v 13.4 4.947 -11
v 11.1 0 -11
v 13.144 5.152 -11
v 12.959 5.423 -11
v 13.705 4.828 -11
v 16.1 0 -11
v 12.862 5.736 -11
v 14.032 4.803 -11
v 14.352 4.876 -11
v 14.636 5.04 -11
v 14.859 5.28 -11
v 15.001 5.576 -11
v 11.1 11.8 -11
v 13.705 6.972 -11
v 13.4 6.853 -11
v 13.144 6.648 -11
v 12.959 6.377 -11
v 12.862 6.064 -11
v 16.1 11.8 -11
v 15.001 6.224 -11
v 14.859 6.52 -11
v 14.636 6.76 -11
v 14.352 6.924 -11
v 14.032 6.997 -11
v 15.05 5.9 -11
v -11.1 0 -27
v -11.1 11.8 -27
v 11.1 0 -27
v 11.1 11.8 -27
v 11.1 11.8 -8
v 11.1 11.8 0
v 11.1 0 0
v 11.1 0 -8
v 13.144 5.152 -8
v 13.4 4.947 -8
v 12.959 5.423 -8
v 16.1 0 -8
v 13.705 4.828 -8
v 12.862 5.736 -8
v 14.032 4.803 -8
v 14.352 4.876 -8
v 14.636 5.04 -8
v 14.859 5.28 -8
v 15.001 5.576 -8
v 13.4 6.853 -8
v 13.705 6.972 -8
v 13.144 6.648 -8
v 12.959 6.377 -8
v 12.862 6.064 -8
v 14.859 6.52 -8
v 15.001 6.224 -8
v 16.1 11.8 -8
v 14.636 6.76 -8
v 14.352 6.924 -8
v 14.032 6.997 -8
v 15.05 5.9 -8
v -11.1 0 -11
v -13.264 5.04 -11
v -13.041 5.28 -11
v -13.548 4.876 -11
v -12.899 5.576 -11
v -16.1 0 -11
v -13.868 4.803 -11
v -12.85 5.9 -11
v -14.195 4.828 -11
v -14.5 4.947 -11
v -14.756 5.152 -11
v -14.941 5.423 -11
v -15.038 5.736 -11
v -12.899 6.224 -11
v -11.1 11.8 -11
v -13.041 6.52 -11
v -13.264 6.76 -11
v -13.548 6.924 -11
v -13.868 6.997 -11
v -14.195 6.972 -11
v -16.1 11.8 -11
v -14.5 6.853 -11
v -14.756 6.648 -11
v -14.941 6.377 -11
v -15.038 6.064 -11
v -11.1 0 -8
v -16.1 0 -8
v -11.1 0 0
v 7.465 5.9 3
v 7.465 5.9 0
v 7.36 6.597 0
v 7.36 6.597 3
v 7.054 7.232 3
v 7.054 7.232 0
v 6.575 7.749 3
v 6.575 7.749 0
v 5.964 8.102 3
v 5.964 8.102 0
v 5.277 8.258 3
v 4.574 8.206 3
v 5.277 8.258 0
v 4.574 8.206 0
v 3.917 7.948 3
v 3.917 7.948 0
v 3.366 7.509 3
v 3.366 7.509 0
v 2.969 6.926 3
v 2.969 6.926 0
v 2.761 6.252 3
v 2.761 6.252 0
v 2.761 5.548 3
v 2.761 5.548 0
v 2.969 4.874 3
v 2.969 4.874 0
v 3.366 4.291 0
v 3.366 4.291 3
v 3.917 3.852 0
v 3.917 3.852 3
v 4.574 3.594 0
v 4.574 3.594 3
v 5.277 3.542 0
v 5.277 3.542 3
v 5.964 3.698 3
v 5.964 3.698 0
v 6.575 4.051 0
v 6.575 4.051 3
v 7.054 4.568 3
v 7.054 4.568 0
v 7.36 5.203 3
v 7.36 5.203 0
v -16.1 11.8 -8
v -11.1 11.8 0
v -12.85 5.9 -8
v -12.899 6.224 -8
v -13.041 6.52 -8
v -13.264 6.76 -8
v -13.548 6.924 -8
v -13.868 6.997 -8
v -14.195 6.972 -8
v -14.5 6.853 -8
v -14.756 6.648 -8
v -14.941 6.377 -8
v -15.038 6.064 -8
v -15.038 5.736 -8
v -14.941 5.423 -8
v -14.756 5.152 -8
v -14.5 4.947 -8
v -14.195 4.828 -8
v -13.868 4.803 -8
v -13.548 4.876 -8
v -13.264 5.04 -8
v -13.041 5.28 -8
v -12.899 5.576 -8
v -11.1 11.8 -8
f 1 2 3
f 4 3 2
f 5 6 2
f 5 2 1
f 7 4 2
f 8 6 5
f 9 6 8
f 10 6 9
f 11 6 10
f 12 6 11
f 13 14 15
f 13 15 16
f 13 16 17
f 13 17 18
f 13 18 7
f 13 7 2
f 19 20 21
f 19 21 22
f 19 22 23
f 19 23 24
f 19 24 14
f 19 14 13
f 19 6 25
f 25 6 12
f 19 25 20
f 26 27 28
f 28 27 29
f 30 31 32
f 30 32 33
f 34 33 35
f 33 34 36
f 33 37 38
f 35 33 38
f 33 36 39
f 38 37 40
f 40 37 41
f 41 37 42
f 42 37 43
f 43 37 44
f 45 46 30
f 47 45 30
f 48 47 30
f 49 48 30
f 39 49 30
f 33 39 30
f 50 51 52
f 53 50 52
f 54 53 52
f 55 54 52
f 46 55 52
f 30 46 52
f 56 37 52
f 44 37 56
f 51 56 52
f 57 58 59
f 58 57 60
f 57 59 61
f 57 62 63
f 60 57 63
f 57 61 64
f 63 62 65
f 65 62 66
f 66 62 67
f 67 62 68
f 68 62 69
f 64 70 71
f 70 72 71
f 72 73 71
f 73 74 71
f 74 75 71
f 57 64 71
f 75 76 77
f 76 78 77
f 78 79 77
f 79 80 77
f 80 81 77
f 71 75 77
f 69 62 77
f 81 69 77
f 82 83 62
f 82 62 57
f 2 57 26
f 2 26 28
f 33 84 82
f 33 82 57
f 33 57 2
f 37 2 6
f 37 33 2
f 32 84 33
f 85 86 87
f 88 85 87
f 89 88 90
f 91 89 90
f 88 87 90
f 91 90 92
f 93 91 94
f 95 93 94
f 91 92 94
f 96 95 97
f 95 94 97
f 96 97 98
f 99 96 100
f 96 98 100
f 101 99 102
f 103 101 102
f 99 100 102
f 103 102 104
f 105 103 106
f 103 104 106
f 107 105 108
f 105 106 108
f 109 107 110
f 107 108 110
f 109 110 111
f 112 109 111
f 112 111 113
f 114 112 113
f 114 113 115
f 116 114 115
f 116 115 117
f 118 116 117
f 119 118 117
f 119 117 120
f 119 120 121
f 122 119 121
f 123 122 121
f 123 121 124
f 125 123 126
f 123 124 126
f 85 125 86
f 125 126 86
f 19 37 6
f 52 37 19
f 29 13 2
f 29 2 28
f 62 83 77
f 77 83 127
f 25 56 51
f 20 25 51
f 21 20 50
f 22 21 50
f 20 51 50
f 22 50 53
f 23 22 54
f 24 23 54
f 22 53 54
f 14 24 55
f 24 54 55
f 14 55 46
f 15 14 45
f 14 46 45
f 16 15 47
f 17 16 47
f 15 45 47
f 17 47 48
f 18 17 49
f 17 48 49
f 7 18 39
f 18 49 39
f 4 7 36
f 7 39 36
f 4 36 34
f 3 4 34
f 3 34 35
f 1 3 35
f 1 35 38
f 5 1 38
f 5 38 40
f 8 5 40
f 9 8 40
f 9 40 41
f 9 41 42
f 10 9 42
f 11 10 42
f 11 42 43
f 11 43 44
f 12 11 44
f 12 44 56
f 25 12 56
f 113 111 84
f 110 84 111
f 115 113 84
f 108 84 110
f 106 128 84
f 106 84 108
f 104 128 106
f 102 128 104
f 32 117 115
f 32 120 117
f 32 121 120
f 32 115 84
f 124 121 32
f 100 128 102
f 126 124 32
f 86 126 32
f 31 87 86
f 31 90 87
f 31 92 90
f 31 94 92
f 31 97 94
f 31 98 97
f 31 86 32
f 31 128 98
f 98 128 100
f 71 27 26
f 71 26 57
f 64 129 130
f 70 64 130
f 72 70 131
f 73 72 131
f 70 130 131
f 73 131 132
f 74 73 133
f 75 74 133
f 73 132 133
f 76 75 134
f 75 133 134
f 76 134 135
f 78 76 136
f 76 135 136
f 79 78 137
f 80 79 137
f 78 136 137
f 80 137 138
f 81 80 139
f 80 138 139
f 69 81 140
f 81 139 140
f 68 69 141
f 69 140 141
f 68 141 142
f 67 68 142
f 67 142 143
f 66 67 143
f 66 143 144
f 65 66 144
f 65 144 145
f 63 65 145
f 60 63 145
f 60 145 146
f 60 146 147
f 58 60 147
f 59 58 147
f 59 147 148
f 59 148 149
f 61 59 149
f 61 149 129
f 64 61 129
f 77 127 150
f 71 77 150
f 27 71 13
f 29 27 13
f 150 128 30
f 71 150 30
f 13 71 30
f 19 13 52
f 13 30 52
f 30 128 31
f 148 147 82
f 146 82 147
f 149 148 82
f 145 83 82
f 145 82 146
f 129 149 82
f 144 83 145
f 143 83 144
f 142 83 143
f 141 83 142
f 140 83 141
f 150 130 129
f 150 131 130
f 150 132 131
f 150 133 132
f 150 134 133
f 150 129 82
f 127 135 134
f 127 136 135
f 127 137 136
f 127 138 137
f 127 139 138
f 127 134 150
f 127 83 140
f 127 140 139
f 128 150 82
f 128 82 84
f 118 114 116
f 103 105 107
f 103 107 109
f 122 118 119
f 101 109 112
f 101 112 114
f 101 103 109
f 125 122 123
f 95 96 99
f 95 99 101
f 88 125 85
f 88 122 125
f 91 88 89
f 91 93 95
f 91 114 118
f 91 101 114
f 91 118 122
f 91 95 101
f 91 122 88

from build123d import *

# Parameters (mm, degrees)
SKETCH1_W           = 32.2
SKETCH1_H           = 11.8
BOSS_EXTRUDE1_DEPTH = 27
SKETCH2_R           = 2.365
BOSS_EXTRUDE2_DEPTH = 3
SKETCH4_W           = 16
SKETCH4_H           = 11.8
CUT_EXTRUDE1_DEPTH  = 5
SKETCH5_W           = 16
SKETCH5_H           = 11.8
CUT_EXTRUDE2_DEPTH  = 5
SKETCH6_W           = 8
SKETCH6_H           = 11.8
CUT_EXTRUDE3_DEPTH  = 5
SKETCH7_W           = 8
SKETCH7_H           = 11.8
CUT_EXTRUDE4_DEPTH  = 5
CUT_EXTRUDE5_REACH  = 21
SKETCH8_R           = 1.1


with BuildPart() as part:
    # Sketch1 → Boss-Extrude1 (new body)
    with BuildSketch(Plane.XY):
        with Locations((0, 5.9)):
            Rectangle(SKETCH1_W, SKETCH1_H)
    extrude(amount=-BOSS_EXTRUDE1_DEPTH)

    # Sketch2 → Boss-Extrude2 (add)
    with BuildSketch(Plane.XY):
        with Locations((5.1, 5.9)):
            Circle(SKETCH2_R)
    extrude(amount=BOSS_EXTRUDE2_DEPTH)

    # Sketch4 → Cut-Extrude1 (cut)
    with BuildSketch(Plane(origin=(16.1, 0, 0), x_dir=(0, 0, -1), z_dir=(1, 0, 0))):
        with Locations((19, 5.9)):
            Rectangle(SKETCH4_W, SKETCH4_H)
    extrude(amount=-CUT_EXTRUDE1_DEPTH, mode=Mode.SUBTRACT)

    # Sketch5 → Cut-Extrude2 (cut)
    with BuildSketch(Plane.ZY.offset(16.1)):
        with Locations((-19, 5.9)):
            Rectangle(SKETCH5_W, SKETCH5_H)
    extrude(amount=-CUT_EXTRUDE2_DEPTH, mode=Mode.SUBTRACT)

    # Sketch6 → Cut-Extrude3 (cut)
    with BuildSketch(Plane.ZY.offset(16.1)):
        with Locations((-4, 5.9)):
            Rectangle(SKETCH6_W, SKETCH6_H)
    extrude(amount=-CUT_EXTRUDE3_DEPTH, mode=Mode.SUBTRACT)

    # Sketch7 → Cut-Extrude4 (cut)
    with BuildSketch(Plane(origin=(16.1, 0, 0), x_dir=(0, 0, -1), z_dir=(1, 0, 0))):
        with Locations((4, 5.9)):
            Rectangle(SKETCH7_W, SKETCH7_H)
    extrude(amount=-CUT_EXTRUDE4_DEPTH, mode=Mode.SUBTRACT)

    # Sketch8 → Cut-Extrude5 (cut, up to next)
    with BuildSketch(Plane.XY.offset(-8), mode=Mode.PRIVATE) as cut_extrude5_sk1:
        with Locations((13.95, 5.9)):
            Circle(SKETCH8_R)
    cut_extrude5_tool1 = extrude(cut_extrude5_sk1.sketch, amount=-CUT_EXTRUDE5_REACH, mode=Mode.PRIVATE) & part.part
    add(cut_extrude5_tool1.solids().sort_by_distance((13.95, 5.9, -8))[0], mode=Mode.SUBTRACT)
    # Sketch8 → Cut-Extrude5 (cut, up to next)
    with BuildSketch(Plane.XY.offset(-8), mode=Mode.PRIVATE) as cut_extrude5_sk2:
        with Locations((-13.95, 5.9)):
            Circle(SKETCH8_R)
    cut_extrude5_tool2 = extrude(cut_extrude5_sk2.sketch, amount=-CUT_EXTRUDE5_REACH, mode=Mode.PRIVATE) & part.part
    add(cut_extrude5_tool2.solids().sort_by_distance((-13.95, 5.9, -8))[0], mode=Mode.SUBTRACT)


solid = part.part
